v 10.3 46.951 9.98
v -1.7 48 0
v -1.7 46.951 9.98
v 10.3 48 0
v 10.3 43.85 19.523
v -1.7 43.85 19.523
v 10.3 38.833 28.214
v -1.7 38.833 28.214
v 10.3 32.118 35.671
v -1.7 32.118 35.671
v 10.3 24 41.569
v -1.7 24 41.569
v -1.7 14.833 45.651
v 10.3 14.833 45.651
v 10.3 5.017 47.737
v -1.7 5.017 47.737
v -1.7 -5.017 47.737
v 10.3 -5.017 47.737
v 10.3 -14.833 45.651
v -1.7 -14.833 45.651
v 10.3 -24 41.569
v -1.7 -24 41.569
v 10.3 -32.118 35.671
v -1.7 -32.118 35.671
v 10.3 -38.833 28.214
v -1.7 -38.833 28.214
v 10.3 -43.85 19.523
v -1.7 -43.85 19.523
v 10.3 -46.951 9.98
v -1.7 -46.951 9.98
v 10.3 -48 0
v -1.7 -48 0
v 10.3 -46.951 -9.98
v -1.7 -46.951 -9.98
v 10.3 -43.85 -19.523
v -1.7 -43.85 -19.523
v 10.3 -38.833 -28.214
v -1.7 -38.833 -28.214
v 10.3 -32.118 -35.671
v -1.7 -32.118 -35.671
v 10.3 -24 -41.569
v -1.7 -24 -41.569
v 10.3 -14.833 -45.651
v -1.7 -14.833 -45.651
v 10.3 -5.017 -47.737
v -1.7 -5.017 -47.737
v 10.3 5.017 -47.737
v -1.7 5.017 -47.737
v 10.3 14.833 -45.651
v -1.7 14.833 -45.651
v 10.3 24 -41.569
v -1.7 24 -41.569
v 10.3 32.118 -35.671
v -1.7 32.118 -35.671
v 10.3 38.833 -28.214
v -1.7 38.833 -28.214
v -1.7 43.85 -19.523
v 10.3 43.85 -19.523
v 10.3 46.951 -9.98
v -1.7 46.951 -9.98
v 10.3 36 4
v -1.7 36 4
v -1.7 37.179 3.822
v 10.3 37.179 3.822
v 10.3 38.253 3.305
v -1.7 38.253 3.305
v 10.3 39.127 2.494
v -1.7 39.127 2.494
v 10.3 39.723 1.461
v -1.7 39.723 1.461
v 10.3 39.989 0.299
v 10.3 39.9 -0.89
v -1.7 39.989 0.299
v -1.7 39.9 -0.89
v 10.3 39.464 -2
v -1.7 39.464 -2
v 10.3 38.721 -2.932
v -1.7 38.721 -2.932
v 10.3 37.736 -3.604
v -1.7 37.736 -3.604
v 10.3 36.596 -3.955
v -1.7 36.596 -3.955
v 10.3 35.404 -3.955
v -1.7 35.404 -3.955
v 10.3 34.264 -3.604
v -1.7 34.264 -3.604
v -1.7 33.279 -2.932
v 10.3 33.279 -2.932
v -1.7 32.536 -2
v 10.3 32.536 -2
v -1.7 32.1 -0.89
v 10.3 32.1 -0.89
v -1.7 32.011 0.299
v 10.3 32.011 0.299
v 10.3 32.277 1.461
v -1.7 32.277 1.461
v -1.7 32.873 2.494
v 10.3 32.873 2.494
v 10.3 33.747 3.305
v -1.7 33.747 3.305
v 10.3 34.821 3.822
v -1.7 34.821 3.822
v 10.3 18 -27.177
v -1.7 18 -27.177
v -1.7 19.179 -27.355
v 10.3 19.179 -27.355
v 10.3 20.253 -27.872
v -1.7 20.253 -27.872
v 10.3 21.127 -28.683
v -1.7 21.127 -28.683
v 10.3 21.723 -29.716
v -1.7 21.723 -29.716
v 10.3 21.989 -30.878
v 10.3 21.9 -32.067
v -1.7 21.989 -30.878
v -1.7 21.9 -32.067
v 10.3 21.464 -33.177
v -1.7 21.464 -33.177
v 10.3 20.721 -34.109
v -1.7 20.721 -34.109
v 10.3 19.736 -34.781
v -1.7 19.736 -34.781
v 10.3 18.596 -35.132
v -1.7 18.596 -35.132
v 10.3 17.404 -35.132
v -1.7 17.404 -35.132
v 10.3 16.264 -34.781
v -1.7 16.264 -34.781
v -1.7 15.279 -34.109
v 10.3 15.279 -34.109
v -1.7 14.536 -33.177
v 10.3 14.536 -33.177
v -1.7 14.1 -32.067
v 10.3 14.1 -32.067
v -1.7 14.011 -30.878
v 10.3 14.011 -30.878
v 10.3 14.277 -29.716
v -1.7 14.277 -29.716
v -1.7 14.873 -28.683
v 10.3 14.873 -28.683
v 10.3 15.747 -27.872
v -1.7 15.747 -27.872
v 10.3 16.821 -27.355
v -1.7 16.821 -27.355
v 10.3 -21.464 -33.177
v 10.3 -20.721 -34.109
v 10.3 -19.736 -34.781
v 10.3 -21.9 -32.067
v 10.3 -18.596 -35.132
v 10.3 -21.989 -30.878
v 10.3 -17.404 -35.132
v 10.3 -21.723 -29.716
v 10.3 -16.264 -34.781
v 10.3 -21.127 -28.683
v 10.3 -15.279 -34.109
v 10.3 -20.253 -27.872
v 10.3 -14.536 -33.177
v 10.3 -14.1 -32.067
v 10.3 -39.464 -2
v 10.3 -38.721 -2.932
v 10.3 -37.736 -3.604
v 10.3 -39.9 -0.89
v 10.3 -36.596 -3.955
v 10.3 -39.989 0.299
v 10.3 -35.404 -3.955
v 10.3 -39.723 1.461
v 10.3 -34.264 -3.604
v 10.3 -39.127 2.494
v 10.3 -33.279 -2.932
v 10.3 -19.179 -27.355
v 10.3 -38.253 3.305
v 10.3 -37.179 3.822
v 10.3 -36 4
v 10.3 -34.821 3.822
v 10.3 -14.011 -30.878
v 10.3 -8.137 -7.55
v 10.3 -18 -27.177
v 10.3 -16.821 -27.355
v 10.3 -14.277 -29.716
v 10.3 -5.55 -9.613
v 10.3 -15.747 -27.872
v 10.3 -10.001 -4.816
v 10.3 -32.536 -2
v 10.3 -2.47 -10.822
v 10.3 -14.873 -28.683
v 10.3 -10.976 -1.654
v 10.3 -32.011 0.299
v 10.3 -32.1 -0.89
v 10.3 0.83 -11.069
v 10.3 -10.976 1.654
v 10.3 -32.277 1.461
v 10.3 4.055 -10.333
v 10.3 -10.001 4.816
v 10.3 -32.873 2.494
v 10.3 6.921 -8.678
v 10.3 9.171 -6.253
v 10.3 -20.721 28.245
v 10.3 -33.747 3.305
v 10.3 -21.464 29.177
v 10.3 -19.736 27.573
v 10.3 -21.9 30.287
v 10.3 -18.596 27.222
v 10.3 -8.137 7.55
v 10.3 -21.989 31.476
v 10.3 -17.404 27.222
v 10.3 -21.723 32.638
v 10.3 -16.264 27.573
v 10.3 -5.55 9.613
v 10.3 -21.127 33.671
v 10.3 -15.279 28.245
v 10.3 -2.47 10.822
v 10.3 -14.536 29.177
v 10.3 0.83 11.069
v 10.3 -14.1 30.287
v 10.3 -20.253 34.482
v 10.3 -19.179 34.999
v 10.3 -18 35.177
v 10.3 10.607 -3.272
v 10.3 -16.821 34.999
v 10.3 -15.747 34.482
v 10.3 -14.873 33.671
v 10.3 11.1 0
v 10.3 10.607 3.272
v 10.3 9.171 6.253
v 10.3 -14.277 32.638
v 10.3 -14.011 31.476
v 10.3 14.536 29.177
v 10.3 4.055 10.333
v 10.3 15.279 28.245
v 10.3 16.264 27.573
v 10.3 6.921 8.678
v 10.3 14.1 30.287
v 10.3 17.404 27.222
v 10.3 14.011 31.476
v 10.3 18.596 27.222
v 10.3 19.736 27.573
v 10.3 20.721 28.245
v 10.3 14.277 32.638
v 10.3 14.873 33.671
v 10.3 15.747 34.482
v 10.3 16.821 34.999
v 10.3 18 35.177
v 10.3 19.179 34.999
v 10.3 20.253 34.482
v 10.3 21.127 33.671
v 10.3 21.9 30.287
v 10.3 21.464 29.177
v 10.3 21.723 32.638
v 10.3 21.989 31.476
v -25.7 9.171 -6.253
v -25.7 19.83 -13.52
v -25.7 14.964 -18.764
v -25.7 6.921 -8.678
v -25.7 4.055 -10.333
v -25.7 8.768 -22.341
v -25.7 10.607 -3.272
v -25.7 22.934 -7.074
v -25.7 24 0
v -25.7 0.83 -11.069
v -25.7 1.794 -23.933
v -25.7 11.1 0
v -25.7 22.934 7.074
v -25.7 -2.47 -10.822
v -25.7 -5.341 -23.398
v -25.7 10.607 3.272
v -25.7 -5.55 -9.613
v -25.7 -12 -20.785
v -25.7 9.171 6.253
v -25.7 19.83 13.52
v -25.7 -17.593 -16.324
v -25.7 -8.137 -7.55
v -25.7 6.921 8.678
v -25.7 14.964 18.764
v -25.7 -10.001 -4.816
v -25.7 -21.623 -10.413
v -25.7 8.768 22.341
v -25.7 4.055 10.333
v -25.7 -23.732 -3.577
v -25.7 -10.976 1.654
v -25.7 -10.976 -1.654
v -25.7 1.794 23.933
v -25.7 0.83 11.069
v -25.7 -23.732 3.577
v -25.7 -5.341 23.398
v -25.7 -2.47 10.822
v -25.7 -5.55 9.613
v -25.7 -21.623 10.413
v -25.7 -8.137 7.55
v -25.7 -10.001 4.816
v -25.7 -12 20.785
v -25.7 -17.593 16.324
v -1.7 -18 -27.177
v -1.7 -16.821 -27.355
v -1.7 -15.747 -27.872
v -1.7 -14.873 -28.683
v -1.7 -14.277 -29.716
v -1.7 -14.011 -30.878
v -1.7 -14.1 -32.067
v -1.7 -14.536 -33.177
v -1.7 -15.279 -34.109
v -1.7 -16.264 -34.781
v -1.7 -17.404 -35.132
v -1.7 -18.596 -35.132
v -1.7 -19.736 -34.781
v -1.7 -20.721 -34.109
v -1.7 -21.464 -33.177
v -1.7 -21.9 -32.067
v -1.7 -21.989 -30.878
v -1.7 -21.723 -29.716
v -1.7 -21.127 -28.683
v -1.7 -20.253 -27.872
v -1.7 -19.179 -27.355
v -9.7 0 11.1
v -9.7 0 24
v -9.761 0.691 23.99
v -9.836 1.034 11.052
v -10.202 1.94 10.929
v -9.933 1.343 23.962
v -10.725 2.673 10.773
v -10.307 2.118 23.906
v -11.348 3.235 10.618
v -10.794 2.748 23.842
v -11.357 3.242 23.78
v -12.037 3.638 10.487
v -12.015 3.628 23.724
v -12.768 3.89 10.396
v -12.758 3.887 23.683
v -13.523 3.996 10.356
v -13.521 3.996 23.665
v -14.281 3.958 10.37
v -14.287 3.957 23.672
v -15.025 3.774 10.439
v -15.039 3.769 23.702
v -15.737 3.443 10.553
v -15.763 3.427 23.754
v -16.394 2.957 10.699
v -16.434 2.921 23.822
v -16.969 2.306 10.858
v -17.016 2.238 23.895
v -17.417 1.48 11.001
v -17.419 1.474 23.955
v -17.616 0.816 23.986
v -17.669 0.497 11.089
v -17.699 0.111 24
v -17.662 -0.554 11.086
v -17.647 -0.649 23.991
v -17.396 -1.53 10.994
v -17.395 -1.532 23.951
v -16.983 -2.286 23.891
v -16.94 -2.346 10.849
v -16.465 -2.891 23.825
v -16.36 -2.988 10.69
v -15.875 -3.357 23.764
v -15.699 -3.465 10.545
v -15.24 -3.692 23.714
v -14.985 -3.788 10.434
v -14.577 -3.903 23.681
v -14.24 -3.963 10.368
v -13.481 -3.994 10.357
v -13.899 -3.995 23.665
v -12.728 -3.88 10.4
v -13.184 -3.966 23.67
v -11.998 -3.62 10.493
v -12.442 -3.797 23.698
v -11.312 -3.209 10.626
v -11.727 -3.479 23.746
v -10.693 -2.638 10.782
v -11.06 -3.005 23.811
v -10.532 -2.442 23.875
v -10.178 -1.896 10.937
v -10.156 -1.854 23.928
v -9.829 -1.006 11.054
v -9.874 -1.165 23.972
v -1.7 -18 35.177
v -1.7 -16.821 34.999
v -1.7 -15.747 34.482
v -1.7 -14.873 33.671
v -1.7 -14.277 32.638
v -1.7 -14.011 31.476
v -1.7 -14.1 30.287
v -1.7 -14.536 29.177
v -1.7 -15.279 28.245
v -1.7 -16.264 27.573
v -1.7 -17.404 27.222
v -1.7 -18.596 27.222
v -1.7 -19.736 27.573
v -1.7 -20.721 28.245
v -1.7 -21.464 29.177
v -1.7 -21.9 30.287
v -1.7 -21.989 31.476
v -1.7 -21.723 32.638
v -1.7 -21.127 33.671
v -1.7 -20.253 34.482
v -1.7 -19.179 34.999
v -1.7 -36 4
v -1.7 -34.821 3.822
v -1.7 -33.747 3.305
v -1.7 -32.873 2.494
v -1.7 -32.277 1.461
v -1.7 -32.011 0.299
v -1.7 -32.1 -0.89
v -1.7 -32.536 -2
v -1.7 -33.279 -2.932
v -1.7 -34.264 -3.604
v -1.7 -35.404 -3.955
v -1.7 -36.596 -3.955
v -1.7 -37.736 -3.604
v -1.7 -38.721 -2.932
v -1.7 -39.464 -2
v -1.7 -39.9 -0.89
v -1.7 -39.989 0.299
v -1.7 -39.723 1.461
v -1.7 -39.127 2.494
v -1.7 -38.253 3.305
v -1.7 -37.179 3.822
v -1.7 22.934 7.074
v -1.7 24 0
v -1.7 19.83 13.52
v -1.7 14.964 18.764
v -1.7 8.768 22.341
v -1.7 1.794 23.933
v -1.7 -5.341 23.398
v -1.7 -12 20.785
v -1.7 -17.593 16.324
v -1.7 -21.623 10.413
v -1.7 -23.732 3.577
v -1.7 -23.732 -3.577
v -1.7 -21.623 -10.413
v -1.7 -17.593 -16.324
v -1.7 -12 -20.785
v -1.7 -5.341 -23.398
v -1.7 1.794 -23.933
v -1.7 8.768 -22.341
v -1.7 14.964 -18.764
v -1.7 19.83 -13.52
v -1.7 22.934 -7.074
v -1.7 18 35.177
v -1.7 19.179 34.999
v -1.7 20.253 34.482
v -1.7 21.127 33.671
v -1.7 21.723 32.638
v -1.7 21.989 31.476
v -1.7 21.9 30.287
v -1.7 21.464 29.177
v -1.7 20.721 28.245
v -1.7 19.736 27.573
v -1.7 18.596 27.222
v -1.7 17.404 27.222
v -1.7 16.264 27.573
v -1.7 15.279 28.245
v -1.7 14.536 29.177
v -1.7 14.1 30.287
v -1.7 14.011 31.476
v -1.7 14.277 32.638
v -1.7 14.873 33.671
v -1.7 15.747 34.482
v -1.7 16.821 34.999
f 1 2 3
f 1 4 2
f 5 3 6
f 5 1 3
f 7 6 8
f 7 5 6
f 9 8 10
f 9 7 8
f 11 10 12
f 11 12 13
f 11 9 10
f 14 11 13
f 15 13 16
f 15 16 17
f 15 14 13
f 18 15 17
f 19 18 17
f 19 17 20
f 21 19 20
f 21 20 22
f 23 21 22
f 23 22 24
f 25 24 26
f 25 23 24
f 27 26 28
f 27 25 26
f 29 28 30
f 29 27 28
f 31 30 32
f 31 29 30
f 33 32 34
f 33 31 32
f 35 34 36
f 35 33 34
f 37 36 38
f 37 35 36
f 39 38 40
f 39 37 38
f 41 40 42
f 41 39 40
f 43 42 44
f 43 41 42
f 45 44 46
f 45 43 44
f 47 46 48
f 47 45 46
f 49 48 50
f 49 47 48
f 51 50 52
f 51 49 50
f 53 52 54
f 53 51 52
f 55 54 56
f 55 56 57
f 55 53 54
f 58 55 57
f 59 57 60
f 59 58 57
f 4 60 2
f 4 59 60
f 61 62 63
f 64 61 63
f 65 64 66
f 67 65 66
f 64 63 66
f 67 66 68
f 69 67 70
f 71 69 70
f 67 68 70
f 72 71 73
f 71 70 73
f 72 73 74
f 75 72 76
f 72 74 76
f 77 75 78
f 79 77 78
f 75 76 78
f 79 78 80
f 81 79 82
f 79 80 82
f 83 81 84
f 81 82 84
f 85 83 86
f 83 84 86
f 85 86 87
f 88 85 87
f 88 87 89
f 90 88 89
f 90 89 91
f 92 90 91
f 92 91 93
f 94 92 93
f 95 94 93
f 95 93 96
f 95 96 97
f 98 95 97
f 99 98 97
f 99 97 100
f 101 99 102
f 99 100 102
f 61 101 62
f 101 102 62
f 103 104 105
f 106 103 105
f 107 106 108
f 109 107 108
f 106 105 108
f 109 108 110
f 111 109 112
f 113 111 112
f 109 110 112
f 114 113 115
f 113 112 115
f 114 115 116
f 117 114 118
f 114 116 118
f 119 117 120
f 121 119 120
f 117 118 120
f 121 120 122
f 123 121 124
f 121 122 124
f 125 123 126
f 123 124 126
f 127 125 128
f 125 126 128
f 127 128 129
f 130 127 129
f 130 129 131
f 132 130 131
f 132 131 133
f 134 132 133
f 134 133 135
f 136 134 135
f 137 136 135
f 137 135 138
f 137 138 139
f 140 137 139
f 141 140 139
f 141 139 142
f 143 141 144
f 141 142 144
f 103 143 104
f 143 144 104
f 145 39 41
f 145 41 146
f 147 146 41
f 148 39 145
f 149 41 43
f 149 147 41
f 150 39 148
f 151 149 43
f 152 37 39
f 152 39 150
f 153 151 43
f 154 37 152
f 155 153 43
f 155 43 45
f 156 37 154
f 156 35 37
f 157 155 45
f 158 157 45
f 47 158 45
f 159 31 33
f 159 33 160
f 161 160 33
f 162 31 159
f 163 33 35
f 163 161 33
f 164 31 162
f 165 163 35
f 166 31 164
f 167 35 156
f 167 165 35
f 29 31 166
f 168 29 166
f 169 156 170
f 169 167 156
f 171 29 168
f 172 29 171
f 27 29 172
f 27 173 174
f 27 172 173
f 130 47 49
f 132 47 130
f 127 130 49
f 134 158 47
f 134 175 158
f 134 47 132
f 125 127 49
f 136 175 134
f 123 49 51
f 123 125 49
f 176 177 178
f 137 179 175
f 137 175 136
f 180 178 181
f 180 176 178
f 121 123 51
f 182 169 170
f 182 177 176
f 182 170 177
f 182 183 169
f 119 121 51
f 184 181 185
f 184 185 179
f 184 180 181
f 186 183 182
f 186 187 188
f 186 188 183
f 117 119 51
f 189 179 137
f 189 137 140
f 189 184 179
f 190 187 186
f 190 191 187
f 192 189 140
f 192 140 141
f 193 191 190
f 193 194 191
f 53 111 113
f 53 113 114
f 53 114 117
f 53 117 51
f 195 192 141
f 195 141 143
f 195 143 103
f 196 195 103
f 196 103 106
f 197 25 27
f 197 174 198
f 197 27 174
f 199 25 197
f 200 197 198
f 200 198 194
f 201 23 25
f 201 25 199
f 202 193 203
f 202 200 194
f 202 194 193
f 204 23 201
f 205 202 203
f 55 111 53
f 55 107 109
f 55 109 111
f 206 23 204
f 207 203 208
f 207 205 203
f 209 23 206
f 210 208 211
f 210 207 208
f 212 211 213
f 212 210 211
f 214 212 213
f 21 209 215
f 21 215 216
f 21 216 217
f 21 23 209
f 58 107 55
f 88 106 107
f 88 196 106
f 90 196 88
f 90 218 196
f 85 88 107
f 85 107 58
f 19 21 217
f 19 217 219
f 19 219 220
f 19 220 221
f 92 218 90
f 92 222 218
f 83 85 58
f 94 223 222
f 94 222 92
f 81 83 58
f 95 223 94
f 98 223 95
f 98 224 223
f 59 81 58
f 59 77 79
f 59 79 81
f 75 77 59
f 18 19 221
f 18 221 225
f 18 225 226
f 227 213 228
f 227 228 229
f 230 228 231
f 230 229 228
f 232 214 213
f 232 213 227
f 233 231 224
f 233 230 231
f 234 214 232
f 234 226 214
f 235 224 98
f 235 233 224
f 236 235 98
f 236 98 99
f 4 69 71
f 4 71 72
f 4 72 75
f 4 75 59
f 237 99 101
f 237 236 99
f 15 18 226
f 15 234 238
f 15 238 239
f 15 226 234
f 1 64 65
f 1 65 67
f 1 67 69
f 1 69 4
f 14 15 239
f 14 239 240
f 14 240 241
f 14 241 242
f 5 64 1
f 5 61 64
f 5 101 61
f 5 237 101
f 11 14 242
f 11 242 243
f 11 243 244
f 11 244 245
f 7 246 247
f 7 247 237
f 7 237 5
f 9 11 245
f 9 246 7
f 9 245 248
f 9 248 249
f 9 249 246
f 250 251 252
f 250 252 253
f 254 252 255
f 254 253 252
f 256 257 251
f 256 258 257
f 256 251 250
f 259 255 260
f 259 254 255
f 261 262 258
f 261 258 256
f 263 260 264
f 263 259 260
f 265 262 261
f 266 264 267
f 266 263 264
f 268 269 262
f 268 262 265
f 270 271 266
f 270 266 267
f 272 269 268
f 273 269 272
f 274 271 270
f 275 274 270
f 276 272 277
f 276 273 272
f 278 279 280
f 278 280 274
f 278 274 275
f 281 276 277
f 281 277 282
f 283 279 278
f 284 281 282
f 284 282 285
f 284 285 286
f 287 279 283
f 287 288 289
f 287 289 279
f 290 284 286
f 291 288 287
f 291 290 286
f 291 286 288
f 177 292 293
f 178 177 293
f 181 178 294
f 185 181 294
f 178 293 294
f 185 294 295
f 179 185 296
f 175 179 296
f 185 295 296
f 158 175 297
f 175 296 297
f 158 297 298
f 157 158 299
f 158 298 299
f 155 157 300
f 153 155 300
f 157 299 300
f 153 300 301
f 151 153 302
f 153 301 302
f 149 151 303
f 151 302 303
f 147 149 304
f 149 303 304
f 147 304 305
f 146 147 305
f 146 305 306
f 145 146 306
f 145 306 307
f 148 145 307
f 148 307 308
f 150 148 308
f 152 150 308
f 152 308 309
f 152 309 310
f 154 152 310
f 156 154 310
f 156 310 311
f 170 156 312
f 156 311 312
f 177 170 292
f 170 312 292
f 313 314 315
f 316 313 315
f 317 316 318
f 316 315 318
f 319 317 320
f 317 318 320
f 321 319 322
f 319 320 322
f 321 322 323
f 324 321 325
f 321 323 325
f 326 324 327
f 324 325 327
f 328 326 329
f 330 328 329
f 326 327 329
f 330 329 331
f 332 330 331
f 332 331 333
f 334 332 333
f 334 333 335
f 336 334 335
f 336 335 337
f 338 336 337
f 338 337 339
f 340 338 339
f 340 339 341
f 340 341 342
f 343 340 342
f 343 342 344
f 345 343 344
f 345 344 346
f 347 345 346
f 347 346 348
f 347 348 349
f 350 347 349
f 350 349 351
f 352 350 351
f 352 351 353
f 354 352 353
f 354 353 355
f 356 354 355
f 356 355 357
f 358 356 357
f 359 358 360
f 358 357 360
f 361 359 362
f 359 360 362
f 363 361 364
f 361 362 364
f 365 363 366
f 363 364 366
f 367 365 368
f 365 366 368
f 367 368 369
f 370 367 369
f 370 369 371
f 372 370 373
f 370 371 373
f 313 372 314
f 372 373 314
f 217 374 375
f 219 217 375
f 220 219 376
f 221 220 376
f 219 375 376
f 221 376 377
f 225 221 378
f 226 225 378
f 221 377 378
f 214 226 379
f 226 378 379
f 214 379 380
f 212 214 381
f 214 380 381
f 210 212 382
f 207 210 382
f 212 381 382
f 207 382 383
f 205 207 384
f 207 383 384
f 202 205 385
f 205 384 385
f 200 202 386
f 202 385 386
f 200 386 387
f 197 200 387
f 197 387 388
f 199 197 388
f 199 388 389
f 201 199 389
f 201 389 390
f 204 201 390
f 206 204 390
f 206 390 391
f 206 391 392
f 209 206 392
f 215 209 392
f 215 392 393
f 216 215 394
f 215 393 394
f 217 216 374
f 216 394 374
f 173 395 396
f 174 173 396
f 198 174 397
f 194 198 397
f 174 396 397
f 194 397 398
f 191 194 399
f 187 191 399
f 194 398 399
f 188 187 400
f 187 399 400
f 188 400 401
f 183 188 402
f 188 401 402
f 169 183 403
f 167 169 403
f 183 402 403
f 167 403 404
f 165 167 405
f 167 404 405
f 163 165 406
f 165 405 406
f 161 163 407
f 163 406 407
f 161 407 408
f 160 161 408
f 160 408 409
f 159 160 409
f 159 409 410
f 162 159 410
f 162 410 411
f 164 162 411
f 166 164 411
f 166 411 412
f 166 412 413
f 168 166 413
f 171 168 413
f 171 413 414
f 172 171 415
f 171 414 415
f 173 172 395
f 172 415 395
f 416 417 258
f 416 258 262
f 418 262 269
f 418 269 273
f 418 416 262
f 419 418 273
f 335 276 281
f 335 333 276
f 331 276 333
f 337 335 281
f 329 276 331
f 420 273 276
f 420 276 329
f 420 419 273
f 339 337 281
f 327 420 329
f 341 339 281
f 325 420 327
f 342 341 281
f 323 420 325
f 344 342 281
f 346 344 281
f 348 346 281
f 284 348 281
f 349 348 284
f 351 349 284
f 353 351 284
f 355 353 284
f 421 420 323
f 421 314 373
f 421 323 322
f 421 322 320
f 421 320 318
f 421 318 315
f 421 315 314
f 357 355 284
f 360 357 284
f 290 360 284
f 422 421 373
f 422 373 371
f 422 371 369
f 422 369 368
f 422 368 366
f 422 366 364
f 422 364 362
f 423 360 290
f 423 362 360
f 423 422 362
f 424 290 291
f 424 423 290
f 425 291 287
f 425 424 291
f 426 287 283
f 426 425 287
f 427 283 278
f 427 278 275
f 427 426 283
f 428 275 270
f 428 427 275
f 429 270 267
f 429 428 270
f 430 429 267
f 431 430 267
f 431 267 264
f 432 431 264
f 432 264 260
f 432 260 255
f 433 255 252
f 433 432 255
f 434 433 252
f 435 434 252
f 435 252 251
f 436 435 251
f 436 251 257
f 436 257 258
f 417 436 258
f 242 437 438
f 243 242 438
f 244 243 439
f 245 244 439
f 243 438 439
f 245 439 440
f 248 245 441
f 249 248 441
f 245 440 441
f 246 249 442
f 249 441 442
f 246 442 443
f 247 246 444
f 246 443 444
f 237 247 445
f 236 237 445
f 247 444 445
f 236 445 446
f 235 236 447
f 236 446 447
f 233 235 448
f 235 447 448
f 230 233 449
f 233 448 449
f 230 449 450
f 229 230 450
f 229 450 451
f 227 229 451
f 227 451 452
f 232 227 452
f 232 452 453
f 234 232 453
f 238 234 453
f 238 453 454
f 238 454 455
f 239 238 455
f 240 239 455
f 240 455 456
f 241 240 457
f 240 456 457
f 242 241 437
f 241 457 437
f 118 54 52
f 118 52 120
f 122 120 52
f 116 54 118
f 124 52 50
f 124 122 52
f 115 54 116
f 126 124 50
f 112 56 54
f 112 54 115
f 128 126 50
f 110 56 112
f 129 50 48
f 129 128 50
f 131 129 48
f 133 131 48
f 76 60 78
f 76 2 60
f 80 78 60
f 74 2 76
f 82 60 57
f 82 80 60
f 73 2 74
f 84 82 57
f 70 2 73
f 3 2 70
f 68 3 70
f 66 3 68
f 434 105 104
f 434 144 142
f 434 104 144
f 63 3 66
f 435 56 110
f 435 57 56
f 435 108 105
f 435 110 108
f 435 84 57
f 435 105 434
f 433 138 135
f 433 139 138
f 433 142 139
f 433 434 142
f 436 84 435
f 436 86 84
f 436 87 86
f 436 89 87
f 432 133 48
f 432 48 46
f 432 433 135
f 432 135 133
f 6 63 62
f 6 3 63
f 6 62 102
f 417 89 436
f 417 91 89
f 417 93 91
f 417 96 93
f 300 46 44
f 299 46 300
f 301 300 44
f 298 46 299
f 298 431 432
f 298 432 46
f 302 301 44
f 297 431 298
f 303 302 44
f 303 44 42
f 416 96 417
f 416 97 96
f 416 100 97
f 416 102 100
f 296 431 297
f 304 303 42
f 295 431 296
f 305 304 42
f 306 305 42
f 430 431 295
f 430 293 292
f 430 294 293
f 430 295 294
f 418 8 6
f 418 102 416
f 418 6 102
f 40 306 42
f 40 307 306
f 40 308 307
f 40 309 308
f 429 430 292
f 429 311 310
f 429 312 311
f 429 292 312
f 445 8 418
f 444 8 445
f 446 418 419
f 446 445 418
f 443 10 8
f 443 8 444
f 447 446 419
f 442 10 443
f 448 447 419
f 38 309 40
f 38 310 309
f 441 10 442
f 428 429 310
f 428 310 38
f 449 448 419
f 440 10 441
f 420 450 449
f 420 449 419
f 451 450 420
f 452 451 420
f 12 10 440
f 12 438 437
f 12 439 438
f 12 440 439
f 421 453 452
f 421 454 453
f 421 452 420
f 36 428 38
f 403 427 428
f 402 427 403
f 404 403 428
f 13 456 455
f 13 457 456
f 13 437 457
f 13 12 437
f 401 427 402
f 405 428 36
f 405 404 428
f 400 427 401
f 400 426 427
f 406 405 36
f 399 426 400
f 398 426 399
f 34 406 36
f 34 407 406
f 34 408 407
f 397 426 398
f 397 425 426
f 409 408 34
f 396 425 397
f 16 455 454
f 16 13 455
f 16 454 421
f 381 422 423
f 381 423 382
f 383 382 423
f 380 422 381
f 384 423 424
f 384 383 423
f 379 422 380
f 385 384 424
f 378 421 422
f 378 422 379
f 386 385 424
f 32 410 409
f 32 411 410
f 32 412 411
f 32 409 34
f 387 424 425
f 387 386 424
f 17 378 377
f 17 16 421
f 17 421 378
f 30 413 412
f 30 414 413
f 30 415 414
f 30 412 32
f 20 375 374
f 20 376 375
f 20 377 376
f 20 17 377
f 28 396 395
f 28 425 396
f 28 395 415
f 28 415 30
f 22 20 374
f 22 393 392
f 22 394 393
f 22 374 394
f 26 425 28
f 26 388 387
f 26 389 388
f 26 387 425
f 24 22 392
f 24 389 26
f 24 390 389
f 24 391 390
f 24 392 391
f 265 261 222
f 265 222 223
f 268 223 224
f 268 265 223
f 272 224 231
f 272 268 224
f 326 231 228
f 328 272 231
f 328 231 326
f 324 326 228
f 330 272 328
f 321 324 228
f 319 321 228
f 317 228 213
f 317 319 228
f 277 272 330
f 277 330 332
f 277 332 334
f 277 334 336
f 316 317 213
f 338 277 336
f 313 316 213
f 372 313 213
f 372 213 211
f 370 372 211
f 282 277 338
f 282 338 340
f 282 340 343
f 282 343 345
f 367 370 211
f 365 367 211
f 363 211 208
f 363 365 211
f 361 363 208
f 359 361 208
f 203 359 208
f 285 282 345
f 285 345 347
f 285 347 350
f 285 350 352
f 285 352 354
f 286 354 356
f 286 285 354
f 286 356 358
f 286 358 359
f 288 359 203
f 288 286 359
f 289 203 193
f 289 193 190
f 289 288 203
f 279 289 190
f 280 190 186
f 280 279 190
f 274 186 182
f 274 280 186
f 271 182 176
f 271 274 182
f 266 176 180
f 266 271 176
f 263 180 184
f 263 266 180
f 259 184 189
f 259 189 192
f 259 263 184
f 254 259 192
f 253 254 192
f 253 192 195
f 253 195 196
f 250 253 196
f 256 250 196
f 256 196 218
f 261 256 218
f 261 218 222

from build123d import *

# Parameters (mm, degrees)
SKETCH2_R          = 4
CUT_EXTRUDE1_DEPTH = 12
CUT_EXTRUDE2_REACH = 74
SKETCH3_R          = 4


with BuildPart() as part:
    # Sketch1 → Revolve1 (revolve)
    with BuildSketch(Plane.XY):
        Polygon((-25.700460829, 11.1), (-25.700460829, 24), (-1.700460829, 24), (-1.700460829, 48), (10.299539171, 48), (10.299539171, 11.1), align=None)
    revolve(axis=Axis((-11.612903226, 0, 0), (1, 0, 0)))

    # Sketch2 → Cut-Extrude1 (cut)
    with BuildSketch(Plane.ZY.offset(1.700460829)):
        with Locations((0, 36)):
            Circle(SKETCH2_R)
        with Locations((31.176914536, 18)):
            Circle(SKETCH2_R)
        with Locations((31.176914536, -18)):
            Circle(SKETCH2_R)
        with Locations((0, -36)):
            Circle(SKETCH2_R)
        with Locations((-31.176914536, -18)):
            Circle(SKETCH2_R)
        with Locations((-31.176914536, 18)):
            Circle(SKETCH2_R)
    extrude(amount=-CUT_EXTRUDE1_DEPTH, mode=Mode.SUBTRACT)

    # Sketch3 → Cut-Extrude2 (cut, up to next)
    with BuildSketch(Plane.XY.offset(24), mode=Mode.PRIVATE) as cut_extrude2_sk1:
        with Locations((-13.700460829, 0)):
            Circle(SKETCH3_R)
    cut_extrude2_tool1 = extrude(cut_extrude2_sk1.sketch, amount=-CUT_EXTRUDE2_REACH, mode=Mode.PRIVATE) & part.part
    add(cut_extrude2_tool1.solids().sort_by_distance((-13.700461, 0, 24))[0], mode=Mode.SUBTRACT)


solid = part.part
